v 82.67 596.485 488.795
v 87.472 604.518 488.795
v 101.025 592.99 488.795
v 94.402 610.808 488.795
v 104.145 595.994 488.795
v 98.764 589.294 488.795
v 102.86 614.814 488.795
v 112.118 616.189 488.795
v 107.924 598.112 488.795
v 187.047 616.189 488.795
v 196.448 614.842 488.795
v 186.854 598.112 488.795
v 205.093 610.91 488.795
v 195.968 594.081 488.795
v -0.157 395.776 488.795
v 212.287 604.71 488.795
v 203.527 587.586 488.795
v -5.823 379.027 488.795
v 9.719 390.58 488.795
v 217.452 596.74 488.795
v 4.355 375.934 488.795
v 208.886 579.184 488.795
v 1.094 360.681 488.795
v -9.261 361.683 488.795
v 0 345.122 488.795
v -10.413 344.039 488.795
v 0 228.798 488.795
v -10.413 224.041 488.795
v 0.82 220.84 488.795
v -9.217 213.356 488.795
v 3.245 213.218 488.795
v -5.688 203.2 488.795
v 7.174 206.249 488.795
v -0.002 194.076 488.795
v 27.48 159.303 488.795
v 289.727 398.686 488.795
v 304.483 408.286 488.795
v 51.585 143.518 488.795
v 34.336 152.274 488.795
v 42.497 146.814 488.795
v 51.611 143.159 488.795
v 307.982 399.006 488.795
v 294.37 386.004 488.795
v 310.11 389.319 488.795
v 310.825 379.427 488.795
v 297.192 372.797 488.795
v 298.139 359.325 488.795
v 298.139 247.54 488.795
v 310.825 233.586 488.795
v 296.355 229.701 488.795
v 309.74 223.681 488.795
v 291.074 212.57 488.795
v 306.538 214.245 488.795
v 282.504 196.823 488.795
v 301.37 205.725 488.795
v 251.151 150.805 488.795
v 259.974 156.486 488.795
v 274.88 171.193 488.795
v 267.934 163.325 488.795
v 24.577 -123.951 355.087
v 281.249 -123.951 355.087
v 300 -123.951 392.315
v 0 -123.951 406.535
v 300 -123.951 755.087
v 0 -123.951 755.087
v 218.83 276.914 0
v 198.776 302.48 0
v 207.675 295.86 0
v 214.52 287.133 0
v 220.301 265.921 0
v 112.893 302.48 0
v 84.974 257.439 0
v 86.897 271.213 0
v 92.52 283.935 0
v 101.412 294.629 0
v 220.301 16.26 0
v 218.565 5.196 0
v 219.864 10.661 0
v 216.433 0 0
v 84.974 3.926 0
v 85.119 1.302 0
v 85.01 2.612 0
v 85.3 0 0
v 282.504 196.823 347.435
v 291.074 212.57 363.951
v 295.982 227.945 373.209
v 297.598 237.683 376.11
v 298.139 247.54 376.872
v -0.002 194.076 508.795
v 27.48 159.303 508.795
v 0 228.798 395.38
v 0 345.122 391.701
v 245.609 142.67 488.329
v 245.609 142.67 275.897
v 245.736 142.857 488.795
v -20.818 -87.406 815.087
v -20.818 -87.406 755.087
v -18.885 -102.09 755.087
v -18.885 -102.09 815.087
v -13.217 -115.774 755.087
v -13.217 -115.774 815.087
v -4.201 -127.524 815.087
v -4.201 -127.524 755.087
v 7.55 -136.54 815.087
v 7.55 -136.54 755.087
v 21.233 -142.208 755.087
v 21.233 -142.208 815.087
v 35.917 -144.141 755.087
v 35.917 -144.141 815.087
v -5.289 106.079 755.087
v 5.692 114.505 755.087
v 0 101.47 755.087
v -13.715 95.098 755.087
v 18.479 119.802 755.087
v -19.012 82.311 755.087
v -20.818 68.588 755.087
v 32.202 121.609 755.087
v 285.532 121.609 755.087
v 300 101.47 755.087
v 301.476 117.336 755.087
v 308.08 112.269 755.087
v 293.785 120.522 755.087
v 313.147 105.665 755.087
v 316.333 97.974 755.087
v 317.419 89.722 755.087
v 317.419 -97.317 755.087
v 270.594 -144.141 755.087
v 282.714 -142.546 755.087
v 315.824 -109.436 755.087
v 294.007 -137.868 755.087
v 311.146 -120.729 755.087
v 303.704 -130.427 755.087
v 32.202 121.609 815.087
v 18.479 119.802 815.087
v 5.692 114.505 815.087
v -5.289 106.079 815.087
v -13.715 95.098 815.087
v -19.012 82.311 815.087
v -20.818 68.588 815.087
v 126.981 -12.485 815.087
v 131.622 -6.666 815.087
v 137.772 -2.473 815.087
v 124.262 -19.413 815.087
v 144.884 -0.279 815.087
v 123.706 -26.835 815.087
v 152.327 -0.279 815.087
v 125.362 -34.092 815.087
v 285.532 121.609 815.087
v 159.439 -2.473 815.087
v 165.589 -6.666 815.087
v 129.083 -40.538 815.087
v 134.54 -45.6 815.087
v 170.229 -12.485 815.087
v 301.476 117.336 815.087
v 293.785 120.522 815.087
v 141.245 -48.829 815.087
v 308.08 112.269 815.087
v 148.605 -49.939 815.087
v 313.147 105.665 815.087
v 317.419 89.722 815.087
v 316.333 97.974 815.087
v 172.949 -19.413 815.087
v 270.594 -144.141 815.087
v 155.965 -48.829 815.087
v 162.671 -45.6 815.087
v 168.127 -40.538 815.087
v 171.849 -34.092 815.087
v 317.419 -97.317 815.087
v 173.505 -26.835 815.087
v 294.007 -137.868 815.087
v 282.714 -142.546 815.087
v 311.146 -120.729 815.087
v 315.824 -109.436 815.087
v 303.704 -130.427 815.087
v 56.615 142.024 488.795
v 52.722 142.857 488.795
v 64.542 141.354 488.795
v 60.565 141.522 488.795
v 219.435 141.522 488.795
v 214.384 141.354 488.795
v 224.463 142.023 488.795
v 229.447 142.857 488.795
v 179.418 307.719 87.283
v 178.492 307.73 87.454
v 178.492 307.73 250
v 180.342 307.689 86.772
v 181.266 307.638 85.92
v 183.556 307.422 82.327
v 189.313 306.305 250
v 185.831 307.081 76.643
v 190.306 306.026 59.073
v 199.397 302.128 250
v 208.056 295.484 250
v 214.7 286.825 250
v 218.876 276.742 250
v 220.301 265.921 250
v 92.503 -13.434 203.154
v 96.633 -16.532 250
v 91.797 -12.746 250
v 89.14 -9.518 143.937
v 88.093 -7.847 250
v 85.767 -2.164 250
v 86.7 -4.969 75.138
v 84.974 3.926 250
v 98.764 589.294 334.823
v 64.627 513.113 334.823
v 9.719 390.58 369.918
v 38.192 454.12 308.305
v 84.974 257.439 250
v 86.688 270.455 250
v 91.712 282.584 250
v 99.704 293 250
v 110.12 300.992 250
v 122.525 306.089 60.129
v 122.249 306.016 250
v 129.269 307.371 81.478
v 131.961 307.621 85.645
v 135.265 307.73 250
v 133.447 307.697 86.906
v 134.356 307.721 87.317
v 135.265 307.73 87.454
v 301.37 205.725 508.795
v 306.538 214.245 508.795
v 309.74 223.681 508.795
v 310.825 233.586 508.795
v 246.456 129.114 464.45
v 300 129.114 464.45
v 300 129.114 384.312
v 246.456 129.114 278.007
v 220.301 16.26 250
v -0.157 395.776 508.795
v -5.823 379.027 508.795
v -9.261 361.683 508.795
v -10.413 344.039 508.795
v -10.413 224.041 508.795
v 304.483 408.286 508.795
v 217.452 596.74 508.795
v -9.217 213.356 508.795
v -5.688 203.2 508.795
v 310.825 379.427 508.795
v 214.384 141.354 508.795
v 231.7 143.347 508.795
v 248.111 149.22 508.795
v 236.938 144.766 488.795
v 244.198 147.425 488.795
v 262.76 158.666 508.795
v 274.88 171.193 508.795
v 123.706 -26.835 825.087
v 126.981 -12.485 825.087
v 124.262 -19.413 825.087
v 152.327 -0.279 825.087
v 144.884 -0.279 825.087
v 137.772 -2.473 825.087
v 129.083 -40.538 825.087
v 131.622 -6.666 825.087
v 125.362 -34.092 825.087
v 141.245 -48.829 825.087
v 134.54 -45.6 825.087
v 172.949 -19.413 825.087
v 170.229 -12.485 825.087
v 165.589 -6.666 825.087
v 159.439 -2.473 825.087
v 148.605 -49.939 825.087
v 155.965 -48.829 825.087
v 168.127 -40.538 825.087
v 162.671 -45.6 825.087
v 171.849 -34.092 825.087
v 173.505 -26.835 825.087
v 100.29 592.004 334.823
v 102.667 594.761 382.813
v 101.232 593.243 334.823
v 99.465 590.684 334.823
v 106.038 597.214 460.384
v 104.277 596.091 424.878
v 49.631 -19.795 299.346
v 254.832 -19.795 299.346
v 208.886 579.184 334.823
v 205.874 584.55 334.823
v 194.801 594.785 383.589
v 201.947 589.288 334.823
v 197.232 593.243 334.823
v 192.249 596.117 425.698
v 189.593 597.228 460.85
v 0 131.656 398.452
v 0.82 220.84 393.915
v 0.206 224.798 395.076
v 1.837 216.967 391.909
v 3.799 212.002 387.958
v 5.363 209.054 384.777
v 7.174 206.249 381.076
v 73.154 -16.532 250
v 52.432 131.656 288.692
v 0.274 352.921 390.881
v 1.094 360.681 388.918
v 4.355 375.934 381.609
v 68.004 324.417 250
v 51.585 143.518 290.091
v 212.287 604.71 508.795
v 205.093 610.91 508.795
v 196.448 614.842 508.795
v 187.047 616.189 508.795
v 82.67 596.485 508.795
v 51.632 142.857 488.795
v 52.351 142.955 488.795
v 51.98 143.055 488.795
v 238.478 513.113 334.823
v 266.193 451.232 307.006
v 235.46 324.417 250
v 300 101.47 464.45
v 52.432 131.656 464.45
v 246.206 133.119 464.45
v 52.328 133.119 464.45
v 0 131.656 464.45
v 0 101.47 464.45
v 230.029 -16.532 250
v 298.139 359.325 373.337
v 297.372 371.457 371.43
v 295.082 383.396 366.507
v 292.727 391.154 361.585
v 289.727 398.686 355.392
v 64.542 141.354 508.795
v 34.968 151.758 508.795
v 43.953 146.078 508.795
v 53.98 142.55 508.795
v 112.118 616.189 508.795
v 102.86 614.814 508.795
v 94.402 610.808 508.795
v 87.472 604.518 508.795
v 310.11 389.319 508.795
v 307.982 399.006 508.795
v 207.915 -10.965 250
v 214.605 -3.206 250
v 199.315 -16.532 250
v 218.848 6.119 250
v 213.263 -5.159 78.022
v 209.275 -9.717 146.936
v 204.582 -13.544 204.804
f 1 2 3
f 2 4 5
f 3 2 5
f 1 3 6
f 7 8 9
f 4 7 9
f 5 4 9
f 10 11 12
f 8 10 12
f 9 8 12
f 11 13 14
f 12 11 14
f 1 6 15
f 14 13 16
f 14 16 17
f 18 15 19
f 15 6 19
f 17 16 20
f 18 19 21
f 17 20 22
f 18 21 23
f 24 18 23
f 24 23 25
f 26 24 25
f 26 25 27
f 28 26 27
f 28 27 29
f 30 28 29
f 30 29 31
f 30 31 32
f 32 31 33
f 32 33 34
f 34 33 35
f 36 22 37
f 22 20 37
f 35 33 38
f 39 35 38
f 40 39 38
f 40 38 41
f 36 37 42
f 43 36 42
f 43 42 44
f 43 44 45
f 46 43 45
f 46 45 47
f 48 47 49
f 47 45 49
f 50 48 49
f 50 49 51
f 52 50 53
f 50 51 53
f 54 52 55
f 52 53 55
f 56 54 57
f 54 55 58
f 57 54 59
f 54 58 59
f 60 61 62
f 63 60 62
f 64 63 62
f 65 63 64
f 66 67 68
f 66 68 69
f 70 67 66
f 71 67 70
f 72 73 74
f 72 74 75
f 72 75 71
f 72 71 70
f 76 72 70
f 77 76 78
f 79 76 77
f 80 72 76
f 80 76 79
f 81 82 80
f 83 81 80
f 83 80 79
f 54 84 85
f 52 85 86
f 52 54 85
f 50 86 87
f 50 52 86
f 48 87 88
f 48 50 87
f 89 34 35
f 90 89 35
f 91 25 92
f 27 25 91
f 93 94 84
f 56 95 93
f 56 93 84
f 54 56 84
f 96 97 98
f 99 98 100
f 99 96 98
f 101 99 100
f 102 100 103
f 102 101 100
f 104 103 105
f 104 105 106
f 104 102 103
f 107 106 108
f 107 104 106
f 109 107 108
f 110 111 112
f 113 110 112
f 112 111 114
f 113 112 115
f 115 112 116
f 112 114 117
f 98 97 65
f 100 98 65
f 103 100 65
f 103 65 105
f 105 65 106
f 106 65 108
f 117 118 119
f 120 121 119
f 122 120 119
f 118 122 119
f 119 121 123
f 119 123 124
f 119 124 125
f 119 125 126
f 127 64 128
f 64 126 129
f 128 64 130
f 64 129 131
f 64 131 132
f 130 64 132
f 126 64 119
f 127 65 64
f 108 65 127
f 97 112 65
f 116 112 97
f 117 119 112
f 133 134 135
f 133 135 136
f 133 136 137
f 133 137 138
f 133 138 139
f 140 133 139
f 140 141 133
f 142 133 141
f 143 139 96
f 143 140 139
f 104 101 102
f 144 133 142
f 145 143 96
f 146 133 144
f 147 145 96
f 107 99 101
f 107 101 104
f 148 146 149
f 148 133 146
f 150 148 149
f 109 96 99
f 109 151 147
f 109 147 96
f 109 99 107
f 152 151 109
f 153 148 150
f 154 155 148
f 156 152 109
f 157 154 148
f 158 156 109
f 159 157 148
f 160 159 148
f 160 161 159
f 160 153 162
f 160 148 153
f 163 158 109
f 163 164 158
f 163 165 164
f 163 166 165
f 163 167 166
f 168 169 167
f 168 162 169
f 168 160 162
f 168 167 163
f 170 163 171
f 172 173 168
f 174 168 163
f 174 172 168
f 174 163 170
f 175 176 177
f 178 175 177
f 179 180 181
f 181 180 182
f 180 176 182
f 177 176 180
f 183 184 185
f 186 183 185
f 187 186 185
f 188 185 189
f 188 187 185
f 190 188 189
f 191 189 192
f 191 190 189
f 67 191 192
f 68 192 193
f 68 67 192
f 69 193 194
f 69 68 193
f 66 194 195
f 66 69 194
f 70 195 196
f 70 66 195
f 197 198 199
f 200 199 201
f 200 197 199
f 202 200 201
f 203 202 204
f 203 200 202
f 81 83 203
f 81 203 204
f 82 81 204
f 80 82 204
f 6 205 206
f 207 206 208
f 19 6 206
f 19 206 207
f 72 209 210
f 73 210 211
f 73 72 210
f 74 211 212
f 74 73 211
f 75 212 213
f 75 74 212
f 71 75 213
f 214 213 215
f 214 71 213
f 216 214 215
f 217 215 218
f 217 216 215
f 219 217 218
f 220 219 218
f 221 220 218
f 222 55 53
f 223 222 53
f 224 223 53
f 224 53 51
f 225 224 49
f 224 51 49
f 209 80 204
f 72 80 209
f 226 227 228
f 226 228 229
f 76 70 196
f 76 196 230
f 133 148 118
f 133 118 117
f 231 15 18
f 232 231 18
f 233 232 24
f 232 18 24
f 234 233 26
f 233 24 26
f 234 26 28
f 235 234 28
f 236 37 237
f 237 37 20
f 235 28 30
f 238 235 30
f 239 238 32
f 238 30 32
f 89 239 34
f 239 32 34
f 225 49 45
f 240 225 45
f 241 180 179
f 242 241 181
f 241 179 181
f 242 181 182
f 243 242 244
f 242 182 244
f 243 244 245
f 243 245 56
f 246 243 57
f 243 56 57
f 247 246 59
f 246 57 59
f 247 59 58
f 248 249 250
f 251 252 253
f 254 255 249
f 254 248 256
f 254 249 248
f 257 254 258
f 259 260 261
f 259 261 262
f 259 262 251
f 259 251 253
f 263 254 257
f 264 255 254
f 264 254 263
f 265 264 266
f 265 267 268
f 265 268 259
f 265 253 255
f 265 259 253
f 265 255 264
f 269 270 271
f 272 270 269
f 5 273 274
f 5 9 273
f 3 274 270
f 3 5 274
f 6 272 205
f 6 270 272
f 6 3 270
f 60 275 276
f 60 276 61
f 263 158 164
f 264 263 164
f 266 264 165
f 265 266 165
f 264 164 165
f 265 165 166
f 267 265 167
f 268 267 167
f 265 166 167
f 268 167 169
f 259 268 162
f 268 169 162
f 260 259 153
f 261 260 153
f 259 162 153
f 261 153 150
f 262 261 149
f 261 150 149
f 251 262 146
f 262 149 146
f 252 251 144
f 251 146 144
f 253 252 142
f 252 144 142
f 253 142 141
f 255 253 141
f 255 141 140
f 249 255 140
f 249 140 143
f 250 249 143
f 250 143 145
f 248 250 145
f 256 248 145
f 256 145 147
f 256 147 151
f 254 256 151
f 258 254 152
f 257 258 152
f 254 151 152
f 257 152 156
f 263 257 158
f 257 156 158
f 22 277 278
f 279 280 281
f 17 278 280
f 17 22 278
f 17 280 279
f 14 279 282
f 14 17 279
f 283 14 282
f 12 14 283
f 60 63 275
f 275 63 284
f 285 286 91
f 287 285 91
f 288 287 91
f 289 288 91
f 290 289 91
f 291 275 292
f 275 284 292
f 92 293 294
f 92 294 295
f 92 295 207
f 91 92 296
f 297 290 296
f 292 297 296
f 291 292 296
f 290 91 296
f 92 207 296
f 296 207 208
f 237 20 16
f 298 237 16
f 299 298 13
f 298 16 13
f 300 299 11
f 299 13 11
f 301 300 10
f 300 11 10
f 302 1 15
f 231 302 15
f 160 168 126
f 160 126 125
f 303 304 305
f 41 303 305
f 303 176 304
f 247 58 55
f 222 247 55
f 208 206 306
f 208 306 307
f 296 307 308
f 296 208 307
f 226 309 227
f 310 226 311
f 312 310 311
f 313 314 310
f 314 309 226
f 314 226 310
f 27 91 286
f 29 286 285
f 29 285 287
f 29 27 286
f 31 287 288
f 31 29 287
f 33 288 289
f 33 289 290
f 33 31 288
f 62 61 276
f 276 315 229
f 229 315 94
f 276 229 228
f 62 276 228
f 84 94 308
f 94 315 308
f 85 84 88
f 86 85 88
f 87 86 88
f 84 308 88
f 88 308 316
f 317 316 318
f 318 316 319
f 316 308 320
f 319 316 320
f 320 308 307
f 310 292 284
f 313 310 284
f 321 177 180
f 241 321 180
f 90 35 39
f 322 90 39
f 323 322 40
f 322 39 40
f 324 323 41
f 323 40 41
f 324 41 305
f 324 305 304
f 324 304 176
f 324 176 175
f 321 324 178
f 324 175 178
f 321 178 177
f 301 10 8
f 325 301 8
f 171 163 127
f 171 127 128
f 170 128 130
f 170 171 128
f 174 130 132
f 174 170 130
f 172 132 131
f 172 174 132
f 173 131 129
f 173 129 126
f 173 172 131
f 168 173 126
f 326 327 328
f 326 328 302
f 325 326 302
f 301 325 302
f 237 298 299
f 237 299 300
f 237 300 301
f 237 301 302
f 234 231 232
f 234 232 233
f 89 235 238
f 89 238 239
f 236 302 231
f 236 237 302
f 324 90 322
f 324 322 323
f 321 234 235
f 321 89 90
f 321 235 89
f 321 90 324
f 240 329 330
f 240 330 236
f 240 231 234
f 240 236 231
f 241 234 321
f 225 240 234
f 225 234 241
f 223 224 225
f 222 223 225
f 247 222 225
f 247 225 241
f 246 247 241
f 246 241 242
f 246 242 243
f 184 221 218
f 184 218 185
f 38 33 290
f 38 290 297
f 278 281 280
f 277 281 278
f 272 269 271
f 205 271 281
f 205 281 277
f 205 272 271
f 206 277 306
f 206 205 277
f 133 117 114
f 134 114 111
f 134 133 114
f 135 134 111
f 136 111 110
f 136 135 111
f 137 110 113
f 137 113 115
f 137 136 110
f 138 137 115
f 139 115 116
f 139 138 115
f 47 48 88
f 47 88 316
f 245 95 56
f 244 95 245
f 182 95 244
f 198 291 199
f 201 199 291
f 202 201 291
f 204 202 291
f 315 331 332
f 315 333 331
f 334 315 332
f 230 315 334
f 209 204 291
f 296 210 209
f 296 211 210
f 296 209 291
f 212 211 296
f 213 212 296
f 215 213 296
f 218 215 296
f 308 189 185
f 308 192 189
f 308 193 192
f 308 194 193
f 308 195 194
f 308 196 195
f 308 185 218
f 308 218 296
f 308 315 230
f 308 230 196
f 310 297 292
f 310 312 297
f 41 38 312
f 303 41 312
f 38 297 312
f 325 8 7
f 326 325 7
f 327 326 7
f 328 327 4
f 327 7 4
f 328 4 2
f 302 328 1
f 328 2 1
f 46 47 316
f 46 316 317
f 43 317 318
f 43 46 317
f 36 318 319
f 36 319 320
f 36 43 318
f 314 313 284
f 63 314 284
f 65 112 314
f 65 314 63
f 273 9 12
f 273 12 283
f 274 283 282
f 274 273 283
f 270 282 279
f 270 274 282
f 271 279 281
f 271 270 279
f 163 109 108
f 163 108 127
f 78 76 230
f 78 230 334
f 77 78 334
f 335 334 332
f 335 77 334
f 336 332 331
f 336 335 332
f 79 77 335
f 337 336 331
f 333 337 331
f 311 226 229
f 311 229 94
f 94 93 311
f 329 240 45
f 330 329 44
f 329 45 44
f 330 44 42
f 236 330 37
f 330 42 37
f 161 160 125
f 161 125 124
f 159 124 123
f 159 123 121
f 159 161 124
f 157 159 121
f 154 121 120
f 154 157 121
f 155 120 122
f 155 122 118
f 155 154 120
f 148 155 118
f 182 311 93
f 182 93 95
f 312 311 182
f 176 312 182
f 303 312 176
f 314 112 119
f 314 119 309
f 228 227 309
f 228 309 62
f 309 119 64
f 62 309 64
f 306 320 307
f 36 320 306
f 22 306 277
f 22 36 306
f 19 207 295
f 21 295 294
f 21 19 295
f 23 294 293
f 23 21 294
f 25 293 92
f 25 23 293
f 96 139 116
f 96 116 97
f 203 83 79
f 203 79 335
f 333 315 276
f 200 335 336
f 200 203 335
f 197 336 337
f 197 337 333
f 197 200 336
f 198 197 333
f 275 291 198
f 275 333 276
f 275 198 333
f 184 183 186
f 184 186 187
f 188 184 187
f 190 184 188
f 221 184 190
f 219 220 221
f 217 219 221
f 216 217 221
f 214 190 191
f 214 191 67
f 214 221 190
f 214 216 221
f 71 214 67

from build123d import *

# Parameters (mm, degrees)
PAD_DEPTH       = 300
POCKET_DEPTH    = 488.796135
SKETCH002_W     = 818.782761
SKETCH002_H     = 489.886894
POCKET001_DEPTH = 250
POCKET002_DEPTH = 732.016625
PAD001_DEPTH    = 20
PAD002_DEPTH    = 60
SKETCH006_R     = 24.969388
PAD003_DEPTH    = 10


with BuildPart() as part:
    # Sketch → Pad (new body)
    with BuildSketch(Plane.YZ):
        Polygon((0, 0), (-19.795493, 299.346185), (-123.951116, 355.086699), (-123.951116, 815.086699), (101.470154, 815.086699), (101.470154, 464.449951), (133.118958, 464.449951), (142.856949, 488.795135), (598.112183, 488.795135), (593.243164, 334.823194), (513.112758, 334.823194), (317.295496, 246.798924), (302.479552, 0), align=None)
    extrude(amount=PAD_DEPTH)

    # Sketch001 (on Face3 of Pad) → Pocket (cut, through all)
    with BuildSketch(Plane(origin=(0, 0, 488.795135), x_dir=(0, -1, 0), z_dir=(0, 0, 1))):
        with BuildLine():
            Line((-398.685885, 289.727159), (-579.183769, 208.886406))
            ThreePointArc((-579.183769, 208.886406), (-593.86479, 196.305532), (-599.345764, 177.764505))
            Line((-599.345764, 177.764505), (-599.345764, 114.282631))
            ThreePointArc((-599.345764, 114.282631), (-596.613394, 105.037965), (-589.294345, 98.764115))
            Line((-589.294345, 98.764115), (-390.579573, 9.719232))
            ThreePointArc((-390.579573, 9.719232), (-368.364571, 2.45696), (-345.122148, 0))
            Line((-345.122148, 0), (-228.797617, 0))
            ThreePointArc((-228.797617, 0), (-216.966667, 1.836648), (-206.24937, 7.173706))
            Line((-206.24937, 7.173706), (-143.517624, 51.585079))
            Line((-143.517624, 51.585079), (-131.65593, 52.432343))
            Line((-131.65593, 52.432343), (-131.65593, -48.39209))
            Line((-131.65593, -48.39209), (-645.098022, -48.39209))
            Line((-645.098022, -48.39209), (-645.098022, 347.280304))
            Line((-645.098022, 347.280304), (-129.11412, 347.280304))
            Line((-129.11412, 347.280304), (-129.11412, 246.455841))
            Line((-129.11412, 246.455841), (-142.67038, 245.608597))
            Line((-142.67038, 245.608597), (-196.823145, 282.503901))
            ThreePointArc((-196.823145, 282.503901), (-221.003748, 294.141504), (-247.539678, 298.138977))
            Line((-247.539678, 298.138977), (-359.325075, 298.138977))
            ThreePointArc((-359.325075, 298.138977), (-379.449886, 296.012544), (-398.685885, 289.727159))
        make_face()
    extrude(amount=-POCKET_DEPTH, mode=Mode.SUBTRACT)

    # Sketch002 (on Face10 of Pocket) → Pocket001 (cut)
    with BuildSketch(Plane.YX):
        with Locations((231.305886, 120.791111)):
            Rectangle(SKETCH002_W, SKETCH002_H)
        with BuildLine():
            Line((-19.853376, 184.187614), (-19.853376, 108.753578))
            ThreePointArc((-19.853376, 108.753578), (-12.888522, 91.938931), (3.926125, 84.974077))
            Line((3.926125, 84.974077), (257.438717, 84.974077))
            ThreePointArc((257.438717, 84.974077), (292.99976, 99.703943), (307.729626, 135.264986))
            Line((307.729626, 135.264986), (307.729626, 178.492494))
            ThreePointArc((307.729626, 178.492494), (295.484184, 208.055606), (265.921072, 220.301047))
            Line((265.921072, 220.301047), (16.260057, 220.301047))
            ThreePointArc((16.260057, 220.301047), (-9.275997, 209.723668), (-19.853376, 184.187614))
        make_face(mode=Mode.SUBTRACT)
    extrude(amount=-POCKET001_DEPTH, mode=Mode.SUBTRACT)

    # Sketch003 (on Face37 of Pocket001) → Pocket002 (cut, through all)
    with BuildSketch(Plane(origin=(0, 582.073055, -18.406761), x_dir=(0, 0.031607, 0.9995), z_dir=(0, 0.9995, -0.031607))):
        Polygon((435.498799, 463.280181), (-86.974939, 463.280181), (-86.974939, 225.514861), (240.394508, 225.514861), (435.498799, 323.83508), align=None)
        Polygon((-86.974939, -130.245743), (441.643773, -130.245743), (441.643773, -18.749703), (232.713184, 81.106918), (-86.974939, 81.106918), align=None)
    extrude(amount=-POCKET002_DEPTH, mode=Mode.SUBTRACT)

    # Sketch004 (on Face13 of Pocket002) → Pad001 (join)
    with BuildSketch(Plane(origin=(0, 0, 488.795135), x_dir=(0, -1, 0), z_dir=(0, 0, 1))):
        with BuildLine():
            Line((-171.192747, 274.879835), (-205.725164, 301.3696))
            ThreePointArc((-205.725164, 301.3696), (-218.875285, 308.396663), (-233.586133, 310.82489))
            Line((-233.586133, 310.82489), (-379.426666, 310.82489))
            ThreePointArc((-379.426666, 310.82489), (-394.200864, 309.220658), (-408.286409, 304.482739))
            Line((-408.286409, 304.482739), (-596.739704, 217.45158))
            ThreePointArc((-596.739704, 217.45158), (-610.910495, 205.093416), (-616.18866, 187.046905))
            Line((-616.18866, 187.046905), (-616.18866, 112.117576))
            ThreePointArc((-616.18866, 112.117576), (-610.808276, 94.401768), (-596.484569, 82.670196))
            Line((-596.484569, 82.670196), (-395.775735, -0.157481))
            ThreePointArc((-395.775735, -0.157481), (-370.410961, -7.824527), (-344.039491, -10.413148))
            Line((-344.039491, -10.413148), (-224.040587, -10.413148))
            ThreePointArc((-224.040587, -10.413148), (-208.179544, -7.736142), (-194.07573, -0.001706))
            Line((-194.07573, -0.001706), (-159.302641, 27.480226))
            ThreePointArc((-159.302641, 27.480226), (-146.077517, 43.952537), (-141.354309, 64.542152))
            Line((-141.354309, 64.542152), (-141.354309, 214.384436))
            ThreePointArc((-141.354309, 214.384436), (-149.219607, 248.111375), (-171.192747, 274.879835))
        make_face()
    extrude(amount=PAD001_DEPTH)

    # Sketch005 (on Face12 of Pad001) → Pad002 (join)
    with BuildSketch(Plane(origin=(0, 0, 815.086699), x_dir=(0, -1, 0), z_dir=(0, 0, 1))):
        with BuildLine():
            Line((-121.608505, 285.532054), (-121.608505, 32.202011))
            ThreePointArc((-121.608505, 32.202011), (-106.07924, -5.28895), (-68.58828, -20.818214))
            Line((-68.58828, -20.818214), (87.40585, -20.818214))
            ThreePointArc((87.40585, -20.818214), (127.524005, -4.20073), (144.141488, 35.917424))
            Line((144.141488, 35.917424), (144.141488, 270.594498))
            ThreePointArc((144.141488, 270.594498), (130.426894, 303.704458), (97.316935, 317.419052))
            Line((97.316935, 317.419052), (-89.721507, 317.419052))
            ThreePointArc((-89.721507, 317.419052), (-112.269019, 308.079566), (-121.608505, 285.532054))
        make_face()
    extrude(amount=-PAD002_DEPTH)

    # Sketch006 (on Face70 of Pad002) → Pad003 (join)
    with BuildSketch(Plane(origin=(0, 0, 815.086699), x_dir=(0, -1, 0), z_dir=(0, 0, 1))):
        with Locations((24.969388, 148.605312)):
            Circle(SKETCH006_R)
    extrude(amount=PAD003_DEPTH)


solid = part.part
